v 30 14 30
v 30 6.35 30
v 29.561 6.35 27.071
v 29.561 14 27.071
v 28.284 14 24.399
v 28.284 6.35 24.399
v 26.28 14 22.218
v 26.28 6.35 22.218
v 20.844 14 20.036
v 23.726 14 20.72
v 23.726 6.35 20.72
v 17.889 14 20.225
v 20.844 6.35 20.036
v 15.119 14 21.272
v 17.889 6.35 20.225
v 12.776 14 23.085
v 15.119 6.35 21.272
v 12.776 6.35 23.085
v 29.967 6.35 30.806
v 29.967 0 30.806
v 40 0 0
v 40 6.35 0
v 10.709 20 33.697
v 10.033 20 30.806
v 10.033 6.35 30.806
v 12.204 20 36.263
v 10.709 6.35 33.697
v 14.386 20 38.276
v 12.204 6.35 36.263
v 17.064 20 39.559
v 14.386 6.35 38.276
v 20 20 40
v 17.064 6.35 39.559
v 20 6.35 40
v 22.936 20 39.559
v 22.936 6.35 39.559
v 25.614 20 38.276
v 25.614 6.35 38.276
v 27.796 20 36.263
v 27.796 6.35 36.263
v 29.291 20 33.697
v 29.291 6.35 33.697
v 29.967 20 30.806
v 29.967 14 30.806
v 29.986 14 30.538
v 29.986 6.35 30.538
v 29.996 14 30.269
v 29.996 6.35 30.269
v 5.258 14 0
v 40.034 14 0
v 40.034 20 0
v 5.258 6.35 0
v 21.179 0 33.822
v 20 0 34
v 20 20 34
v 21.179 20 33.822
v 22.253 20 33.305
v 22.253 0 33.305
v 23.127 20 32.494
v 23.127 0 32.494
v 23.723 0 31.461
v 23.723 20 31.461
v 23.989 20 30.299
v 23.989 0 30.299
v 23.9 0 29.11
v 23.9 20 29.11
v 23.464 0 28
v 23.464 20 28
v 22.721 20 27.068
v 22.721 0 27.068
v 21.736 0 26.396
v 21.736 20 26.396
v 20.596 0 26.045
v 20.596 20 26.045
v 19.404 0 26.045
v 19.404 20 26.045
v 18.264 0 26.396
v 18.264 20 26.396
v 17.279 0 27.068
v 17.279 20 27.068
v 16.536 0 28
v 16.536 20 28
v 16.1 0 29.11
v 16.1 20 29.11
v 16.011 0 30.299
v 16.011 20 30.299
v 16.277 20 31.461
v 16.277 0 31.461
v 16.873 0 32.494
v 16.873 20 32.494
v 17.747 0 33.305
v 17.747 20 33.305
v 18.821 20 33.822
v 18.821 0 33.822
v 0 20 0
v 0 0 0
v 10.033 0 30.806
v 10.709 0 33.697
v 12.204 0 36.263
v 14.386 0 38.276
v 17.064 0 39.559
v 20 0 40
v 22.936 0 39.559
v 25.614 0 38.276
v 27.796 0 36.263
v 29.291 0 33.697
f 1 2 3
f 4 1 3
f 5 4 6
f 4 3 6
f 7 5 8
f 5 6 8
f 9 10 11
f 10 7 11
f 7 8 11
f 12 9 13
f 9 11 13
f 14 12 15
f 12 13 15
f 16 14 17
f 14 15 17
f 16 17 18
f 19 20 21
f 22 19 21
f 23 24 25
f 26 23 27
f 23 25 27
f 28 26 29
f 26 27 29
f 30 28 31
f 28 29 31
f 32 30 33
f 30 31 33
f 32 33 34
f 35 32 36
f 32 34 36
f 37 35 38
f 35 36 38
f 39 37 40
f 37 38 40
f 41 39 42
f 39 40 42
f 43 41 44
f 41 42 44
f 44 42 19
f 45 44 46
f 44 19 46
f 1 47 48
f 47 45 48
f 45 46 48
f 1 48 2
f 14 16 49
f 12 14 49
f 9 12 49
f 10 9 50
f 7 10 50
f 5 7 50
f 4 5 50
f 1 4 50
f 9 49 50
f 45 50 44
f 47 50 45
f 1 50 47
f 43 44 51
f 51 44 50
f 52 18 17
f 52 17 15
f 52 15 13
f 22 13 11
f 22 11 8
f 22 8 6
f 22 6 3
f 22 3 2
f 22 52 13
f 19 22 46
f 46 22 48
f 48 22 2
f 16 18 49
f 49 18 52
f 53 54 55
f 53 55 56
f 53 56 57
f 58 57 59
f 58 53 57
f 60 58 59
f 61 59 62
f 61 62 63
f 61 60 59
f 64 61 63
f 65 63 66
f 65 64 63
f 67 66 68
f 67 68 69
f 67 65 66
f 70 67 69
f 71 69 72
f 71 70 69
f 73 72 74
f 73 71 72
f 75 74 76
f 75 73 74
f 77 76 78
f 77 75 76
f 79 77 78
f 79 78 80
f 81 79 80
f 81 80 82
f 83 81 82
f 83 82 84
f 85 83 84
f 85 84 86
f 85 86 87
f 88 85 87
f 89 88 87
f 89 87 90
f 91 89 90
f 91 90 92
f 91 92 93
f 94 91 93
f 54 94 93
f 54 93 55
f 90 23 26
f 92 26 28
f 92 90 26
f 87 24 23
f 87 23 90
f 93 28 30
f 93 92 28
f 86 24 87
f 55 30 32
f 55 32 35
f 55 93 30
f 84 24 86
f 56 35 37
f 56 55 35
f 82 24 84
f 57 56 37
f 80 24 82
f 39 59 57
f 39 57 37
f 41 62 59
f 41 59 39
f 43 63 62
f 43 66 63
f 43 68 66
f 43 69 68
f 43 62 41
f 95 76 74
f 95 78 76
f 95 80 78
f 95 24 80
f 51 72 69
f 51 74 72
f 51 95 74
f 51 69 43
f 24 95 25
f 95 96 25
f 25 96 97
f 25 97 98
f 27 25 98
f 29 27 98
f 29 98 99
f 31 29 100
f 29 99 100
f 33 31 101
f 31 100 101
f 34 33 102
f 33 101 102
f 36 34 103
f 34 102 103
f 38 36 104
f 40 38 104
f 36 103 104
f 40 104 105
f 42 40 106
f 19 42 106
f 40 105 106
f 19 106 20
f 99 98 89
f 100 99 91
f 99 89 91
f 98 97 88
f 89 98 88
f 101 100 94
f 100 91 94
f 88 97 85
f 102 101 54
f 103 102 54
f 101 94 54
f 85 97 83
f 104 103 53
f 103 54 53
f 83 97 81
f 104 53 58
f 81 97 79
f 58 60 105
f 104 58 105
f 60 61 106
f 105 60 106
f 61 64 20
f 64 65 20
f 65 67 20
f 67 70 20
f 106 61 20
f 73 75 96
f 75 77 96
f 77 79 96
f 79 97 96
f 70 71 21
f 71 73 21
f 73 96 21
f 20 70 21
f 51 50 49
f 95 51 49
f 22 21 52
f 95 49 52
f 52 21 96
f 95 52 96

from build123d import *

# Parameters (mm, degrees)
SKETCH1_R           = 4
BOSS_EXTRUDE1_DEPTH = 6.35
SKETCH1_3_R         = 4
BOSS_EXTRUDE2_DEPTH = 20
BOSS_EXTRUDE3_START = -6
SKETCH2_R           = 4
BOSS_EXTRUDE3_DEPTH = 6


with BuildPart() as part:
    # Sketch1 → Boss-Extrude1 (new body)
    with BuildSketch(Plane(origin=(0, 0, 0), x_dir=(1, 0, 0), z_dir=(0, 1, 0))):
        with BuildLine():
            Line((0, 0), (10.032558322, -30.806291758))
            ThreePointArc((10.032558322, -30.806291758), (20, -40), (29.967441678, -30.806291758))
            Line((29.967441678, -30.806291758), (40, 0))
            Line((40, 0), (0, 0))
        make_face()
        with Locations((20, -30)):
            Circle(SKETCH1_R, mode=Mode.SUBTRACT)
    extrude(amount=BOSS_EXTRUDE1_DEPTH)

    # Sketch1<3> → Boss-Extrude2 (add)
    with BuildSketch(Plane(origin=(0, 0, 0), x_dir=(1, 0, 0), z_dir=(0, 1, 0))):
        with BuildLine():
            Line((5.258465246, 0), (0, 0))
            Line((0, 0), (10.032558322, -30.806291758))
            ThreePointArc((10.032558322, -30.806291758), (29.422749475, -33.34840146), (12.776404659, -23.084823187))
            Line((12.776404659, -23.084823187), (5.258465246, 0))
        make_face()
        with Locations((20, -30)):
            Circle(SKETCH1_3_R, mode=Mode.SUBTRACT)
    extrude(amount=BOSS_EXTRUDE2_DEPTH)

    # Sketch2 → Boss-Extrude3 (add)
    with BuildSketch(Plane(origin=(0, 20, 0), x_dir=(1, 0, 0), z_dir=(0, 1, 0)).offset(BOSS_EXTRUDE3_START)):
        with BuildLine():
            Line((40.034175669, 0), (0, 0))
            Line((0, 0), (10.032558322, -30.806291758))
            ThreePointArc((10.032558322, -30.806291758), (20, -40), (29.967441678, -30.806291758))
            Line((29.967441678, -30.806291758), (40.034175669, 0))
        make_face()
        with Locations((20, -30)):
            Circle(SKETCH2_R, mode=Mode.SUBTRACT)
    extrude(amount=BOSS_EXTRUDE3_DEPTH)


solid = part.part
